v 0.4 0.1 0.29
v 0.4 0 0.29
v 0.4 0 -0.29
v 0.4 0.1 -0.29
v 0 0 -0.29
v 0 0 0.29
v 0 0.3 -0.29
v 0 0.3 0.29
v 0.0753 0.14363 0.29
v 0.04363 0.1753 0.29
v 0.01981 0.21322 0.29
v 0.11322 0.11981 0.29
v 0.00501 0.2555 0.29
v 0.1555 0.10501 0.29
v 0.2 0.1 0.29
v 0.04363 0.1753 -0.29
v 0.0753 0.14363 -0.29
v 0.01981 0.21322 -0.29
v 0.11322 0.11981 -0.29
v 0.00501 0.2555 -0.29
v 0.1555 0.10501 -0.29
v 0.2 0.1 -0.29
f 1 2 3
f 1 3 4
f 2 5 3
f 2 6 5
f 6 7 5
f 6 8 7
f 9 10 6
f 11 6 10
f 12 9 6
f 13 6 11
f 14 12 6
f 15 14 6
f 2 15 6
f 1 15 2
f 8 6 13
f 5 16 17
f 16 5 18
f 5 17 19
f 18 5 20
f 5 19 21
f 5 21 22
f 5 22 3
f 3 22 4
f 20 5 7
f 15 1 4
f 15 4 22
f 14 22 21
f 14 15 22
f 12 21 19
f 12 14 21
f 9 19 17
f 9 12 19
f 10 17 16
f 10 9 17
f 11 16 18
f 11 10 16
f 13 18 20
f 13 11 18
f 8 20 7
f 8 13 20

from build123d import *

# Parameters (mm, degrees)
BOSS_EXTRUDE1_DEPTH = 0.29


with BuildPart() as part:
    # Sketch1 → Boss-Extrude1 (new, symmetric)
    with BuildSketch(Plane.XY):
        with BuildLine():
            Line((0, 0), (0.4, 0))
            Line((0.4, 0), (0.4, 0.1))
            Line((0.4, 0.1), (0.2, 0.1))
            ThreePointArc((0.2, 0.1), (0.058578644, 0.158578644), (0, 0.3))
            Line((0, 0.3), (0, 0))
        make_face()
    extrude(amount=BOSS_EXTRUDE1_DEPTH, both=True)


solid = part.part
